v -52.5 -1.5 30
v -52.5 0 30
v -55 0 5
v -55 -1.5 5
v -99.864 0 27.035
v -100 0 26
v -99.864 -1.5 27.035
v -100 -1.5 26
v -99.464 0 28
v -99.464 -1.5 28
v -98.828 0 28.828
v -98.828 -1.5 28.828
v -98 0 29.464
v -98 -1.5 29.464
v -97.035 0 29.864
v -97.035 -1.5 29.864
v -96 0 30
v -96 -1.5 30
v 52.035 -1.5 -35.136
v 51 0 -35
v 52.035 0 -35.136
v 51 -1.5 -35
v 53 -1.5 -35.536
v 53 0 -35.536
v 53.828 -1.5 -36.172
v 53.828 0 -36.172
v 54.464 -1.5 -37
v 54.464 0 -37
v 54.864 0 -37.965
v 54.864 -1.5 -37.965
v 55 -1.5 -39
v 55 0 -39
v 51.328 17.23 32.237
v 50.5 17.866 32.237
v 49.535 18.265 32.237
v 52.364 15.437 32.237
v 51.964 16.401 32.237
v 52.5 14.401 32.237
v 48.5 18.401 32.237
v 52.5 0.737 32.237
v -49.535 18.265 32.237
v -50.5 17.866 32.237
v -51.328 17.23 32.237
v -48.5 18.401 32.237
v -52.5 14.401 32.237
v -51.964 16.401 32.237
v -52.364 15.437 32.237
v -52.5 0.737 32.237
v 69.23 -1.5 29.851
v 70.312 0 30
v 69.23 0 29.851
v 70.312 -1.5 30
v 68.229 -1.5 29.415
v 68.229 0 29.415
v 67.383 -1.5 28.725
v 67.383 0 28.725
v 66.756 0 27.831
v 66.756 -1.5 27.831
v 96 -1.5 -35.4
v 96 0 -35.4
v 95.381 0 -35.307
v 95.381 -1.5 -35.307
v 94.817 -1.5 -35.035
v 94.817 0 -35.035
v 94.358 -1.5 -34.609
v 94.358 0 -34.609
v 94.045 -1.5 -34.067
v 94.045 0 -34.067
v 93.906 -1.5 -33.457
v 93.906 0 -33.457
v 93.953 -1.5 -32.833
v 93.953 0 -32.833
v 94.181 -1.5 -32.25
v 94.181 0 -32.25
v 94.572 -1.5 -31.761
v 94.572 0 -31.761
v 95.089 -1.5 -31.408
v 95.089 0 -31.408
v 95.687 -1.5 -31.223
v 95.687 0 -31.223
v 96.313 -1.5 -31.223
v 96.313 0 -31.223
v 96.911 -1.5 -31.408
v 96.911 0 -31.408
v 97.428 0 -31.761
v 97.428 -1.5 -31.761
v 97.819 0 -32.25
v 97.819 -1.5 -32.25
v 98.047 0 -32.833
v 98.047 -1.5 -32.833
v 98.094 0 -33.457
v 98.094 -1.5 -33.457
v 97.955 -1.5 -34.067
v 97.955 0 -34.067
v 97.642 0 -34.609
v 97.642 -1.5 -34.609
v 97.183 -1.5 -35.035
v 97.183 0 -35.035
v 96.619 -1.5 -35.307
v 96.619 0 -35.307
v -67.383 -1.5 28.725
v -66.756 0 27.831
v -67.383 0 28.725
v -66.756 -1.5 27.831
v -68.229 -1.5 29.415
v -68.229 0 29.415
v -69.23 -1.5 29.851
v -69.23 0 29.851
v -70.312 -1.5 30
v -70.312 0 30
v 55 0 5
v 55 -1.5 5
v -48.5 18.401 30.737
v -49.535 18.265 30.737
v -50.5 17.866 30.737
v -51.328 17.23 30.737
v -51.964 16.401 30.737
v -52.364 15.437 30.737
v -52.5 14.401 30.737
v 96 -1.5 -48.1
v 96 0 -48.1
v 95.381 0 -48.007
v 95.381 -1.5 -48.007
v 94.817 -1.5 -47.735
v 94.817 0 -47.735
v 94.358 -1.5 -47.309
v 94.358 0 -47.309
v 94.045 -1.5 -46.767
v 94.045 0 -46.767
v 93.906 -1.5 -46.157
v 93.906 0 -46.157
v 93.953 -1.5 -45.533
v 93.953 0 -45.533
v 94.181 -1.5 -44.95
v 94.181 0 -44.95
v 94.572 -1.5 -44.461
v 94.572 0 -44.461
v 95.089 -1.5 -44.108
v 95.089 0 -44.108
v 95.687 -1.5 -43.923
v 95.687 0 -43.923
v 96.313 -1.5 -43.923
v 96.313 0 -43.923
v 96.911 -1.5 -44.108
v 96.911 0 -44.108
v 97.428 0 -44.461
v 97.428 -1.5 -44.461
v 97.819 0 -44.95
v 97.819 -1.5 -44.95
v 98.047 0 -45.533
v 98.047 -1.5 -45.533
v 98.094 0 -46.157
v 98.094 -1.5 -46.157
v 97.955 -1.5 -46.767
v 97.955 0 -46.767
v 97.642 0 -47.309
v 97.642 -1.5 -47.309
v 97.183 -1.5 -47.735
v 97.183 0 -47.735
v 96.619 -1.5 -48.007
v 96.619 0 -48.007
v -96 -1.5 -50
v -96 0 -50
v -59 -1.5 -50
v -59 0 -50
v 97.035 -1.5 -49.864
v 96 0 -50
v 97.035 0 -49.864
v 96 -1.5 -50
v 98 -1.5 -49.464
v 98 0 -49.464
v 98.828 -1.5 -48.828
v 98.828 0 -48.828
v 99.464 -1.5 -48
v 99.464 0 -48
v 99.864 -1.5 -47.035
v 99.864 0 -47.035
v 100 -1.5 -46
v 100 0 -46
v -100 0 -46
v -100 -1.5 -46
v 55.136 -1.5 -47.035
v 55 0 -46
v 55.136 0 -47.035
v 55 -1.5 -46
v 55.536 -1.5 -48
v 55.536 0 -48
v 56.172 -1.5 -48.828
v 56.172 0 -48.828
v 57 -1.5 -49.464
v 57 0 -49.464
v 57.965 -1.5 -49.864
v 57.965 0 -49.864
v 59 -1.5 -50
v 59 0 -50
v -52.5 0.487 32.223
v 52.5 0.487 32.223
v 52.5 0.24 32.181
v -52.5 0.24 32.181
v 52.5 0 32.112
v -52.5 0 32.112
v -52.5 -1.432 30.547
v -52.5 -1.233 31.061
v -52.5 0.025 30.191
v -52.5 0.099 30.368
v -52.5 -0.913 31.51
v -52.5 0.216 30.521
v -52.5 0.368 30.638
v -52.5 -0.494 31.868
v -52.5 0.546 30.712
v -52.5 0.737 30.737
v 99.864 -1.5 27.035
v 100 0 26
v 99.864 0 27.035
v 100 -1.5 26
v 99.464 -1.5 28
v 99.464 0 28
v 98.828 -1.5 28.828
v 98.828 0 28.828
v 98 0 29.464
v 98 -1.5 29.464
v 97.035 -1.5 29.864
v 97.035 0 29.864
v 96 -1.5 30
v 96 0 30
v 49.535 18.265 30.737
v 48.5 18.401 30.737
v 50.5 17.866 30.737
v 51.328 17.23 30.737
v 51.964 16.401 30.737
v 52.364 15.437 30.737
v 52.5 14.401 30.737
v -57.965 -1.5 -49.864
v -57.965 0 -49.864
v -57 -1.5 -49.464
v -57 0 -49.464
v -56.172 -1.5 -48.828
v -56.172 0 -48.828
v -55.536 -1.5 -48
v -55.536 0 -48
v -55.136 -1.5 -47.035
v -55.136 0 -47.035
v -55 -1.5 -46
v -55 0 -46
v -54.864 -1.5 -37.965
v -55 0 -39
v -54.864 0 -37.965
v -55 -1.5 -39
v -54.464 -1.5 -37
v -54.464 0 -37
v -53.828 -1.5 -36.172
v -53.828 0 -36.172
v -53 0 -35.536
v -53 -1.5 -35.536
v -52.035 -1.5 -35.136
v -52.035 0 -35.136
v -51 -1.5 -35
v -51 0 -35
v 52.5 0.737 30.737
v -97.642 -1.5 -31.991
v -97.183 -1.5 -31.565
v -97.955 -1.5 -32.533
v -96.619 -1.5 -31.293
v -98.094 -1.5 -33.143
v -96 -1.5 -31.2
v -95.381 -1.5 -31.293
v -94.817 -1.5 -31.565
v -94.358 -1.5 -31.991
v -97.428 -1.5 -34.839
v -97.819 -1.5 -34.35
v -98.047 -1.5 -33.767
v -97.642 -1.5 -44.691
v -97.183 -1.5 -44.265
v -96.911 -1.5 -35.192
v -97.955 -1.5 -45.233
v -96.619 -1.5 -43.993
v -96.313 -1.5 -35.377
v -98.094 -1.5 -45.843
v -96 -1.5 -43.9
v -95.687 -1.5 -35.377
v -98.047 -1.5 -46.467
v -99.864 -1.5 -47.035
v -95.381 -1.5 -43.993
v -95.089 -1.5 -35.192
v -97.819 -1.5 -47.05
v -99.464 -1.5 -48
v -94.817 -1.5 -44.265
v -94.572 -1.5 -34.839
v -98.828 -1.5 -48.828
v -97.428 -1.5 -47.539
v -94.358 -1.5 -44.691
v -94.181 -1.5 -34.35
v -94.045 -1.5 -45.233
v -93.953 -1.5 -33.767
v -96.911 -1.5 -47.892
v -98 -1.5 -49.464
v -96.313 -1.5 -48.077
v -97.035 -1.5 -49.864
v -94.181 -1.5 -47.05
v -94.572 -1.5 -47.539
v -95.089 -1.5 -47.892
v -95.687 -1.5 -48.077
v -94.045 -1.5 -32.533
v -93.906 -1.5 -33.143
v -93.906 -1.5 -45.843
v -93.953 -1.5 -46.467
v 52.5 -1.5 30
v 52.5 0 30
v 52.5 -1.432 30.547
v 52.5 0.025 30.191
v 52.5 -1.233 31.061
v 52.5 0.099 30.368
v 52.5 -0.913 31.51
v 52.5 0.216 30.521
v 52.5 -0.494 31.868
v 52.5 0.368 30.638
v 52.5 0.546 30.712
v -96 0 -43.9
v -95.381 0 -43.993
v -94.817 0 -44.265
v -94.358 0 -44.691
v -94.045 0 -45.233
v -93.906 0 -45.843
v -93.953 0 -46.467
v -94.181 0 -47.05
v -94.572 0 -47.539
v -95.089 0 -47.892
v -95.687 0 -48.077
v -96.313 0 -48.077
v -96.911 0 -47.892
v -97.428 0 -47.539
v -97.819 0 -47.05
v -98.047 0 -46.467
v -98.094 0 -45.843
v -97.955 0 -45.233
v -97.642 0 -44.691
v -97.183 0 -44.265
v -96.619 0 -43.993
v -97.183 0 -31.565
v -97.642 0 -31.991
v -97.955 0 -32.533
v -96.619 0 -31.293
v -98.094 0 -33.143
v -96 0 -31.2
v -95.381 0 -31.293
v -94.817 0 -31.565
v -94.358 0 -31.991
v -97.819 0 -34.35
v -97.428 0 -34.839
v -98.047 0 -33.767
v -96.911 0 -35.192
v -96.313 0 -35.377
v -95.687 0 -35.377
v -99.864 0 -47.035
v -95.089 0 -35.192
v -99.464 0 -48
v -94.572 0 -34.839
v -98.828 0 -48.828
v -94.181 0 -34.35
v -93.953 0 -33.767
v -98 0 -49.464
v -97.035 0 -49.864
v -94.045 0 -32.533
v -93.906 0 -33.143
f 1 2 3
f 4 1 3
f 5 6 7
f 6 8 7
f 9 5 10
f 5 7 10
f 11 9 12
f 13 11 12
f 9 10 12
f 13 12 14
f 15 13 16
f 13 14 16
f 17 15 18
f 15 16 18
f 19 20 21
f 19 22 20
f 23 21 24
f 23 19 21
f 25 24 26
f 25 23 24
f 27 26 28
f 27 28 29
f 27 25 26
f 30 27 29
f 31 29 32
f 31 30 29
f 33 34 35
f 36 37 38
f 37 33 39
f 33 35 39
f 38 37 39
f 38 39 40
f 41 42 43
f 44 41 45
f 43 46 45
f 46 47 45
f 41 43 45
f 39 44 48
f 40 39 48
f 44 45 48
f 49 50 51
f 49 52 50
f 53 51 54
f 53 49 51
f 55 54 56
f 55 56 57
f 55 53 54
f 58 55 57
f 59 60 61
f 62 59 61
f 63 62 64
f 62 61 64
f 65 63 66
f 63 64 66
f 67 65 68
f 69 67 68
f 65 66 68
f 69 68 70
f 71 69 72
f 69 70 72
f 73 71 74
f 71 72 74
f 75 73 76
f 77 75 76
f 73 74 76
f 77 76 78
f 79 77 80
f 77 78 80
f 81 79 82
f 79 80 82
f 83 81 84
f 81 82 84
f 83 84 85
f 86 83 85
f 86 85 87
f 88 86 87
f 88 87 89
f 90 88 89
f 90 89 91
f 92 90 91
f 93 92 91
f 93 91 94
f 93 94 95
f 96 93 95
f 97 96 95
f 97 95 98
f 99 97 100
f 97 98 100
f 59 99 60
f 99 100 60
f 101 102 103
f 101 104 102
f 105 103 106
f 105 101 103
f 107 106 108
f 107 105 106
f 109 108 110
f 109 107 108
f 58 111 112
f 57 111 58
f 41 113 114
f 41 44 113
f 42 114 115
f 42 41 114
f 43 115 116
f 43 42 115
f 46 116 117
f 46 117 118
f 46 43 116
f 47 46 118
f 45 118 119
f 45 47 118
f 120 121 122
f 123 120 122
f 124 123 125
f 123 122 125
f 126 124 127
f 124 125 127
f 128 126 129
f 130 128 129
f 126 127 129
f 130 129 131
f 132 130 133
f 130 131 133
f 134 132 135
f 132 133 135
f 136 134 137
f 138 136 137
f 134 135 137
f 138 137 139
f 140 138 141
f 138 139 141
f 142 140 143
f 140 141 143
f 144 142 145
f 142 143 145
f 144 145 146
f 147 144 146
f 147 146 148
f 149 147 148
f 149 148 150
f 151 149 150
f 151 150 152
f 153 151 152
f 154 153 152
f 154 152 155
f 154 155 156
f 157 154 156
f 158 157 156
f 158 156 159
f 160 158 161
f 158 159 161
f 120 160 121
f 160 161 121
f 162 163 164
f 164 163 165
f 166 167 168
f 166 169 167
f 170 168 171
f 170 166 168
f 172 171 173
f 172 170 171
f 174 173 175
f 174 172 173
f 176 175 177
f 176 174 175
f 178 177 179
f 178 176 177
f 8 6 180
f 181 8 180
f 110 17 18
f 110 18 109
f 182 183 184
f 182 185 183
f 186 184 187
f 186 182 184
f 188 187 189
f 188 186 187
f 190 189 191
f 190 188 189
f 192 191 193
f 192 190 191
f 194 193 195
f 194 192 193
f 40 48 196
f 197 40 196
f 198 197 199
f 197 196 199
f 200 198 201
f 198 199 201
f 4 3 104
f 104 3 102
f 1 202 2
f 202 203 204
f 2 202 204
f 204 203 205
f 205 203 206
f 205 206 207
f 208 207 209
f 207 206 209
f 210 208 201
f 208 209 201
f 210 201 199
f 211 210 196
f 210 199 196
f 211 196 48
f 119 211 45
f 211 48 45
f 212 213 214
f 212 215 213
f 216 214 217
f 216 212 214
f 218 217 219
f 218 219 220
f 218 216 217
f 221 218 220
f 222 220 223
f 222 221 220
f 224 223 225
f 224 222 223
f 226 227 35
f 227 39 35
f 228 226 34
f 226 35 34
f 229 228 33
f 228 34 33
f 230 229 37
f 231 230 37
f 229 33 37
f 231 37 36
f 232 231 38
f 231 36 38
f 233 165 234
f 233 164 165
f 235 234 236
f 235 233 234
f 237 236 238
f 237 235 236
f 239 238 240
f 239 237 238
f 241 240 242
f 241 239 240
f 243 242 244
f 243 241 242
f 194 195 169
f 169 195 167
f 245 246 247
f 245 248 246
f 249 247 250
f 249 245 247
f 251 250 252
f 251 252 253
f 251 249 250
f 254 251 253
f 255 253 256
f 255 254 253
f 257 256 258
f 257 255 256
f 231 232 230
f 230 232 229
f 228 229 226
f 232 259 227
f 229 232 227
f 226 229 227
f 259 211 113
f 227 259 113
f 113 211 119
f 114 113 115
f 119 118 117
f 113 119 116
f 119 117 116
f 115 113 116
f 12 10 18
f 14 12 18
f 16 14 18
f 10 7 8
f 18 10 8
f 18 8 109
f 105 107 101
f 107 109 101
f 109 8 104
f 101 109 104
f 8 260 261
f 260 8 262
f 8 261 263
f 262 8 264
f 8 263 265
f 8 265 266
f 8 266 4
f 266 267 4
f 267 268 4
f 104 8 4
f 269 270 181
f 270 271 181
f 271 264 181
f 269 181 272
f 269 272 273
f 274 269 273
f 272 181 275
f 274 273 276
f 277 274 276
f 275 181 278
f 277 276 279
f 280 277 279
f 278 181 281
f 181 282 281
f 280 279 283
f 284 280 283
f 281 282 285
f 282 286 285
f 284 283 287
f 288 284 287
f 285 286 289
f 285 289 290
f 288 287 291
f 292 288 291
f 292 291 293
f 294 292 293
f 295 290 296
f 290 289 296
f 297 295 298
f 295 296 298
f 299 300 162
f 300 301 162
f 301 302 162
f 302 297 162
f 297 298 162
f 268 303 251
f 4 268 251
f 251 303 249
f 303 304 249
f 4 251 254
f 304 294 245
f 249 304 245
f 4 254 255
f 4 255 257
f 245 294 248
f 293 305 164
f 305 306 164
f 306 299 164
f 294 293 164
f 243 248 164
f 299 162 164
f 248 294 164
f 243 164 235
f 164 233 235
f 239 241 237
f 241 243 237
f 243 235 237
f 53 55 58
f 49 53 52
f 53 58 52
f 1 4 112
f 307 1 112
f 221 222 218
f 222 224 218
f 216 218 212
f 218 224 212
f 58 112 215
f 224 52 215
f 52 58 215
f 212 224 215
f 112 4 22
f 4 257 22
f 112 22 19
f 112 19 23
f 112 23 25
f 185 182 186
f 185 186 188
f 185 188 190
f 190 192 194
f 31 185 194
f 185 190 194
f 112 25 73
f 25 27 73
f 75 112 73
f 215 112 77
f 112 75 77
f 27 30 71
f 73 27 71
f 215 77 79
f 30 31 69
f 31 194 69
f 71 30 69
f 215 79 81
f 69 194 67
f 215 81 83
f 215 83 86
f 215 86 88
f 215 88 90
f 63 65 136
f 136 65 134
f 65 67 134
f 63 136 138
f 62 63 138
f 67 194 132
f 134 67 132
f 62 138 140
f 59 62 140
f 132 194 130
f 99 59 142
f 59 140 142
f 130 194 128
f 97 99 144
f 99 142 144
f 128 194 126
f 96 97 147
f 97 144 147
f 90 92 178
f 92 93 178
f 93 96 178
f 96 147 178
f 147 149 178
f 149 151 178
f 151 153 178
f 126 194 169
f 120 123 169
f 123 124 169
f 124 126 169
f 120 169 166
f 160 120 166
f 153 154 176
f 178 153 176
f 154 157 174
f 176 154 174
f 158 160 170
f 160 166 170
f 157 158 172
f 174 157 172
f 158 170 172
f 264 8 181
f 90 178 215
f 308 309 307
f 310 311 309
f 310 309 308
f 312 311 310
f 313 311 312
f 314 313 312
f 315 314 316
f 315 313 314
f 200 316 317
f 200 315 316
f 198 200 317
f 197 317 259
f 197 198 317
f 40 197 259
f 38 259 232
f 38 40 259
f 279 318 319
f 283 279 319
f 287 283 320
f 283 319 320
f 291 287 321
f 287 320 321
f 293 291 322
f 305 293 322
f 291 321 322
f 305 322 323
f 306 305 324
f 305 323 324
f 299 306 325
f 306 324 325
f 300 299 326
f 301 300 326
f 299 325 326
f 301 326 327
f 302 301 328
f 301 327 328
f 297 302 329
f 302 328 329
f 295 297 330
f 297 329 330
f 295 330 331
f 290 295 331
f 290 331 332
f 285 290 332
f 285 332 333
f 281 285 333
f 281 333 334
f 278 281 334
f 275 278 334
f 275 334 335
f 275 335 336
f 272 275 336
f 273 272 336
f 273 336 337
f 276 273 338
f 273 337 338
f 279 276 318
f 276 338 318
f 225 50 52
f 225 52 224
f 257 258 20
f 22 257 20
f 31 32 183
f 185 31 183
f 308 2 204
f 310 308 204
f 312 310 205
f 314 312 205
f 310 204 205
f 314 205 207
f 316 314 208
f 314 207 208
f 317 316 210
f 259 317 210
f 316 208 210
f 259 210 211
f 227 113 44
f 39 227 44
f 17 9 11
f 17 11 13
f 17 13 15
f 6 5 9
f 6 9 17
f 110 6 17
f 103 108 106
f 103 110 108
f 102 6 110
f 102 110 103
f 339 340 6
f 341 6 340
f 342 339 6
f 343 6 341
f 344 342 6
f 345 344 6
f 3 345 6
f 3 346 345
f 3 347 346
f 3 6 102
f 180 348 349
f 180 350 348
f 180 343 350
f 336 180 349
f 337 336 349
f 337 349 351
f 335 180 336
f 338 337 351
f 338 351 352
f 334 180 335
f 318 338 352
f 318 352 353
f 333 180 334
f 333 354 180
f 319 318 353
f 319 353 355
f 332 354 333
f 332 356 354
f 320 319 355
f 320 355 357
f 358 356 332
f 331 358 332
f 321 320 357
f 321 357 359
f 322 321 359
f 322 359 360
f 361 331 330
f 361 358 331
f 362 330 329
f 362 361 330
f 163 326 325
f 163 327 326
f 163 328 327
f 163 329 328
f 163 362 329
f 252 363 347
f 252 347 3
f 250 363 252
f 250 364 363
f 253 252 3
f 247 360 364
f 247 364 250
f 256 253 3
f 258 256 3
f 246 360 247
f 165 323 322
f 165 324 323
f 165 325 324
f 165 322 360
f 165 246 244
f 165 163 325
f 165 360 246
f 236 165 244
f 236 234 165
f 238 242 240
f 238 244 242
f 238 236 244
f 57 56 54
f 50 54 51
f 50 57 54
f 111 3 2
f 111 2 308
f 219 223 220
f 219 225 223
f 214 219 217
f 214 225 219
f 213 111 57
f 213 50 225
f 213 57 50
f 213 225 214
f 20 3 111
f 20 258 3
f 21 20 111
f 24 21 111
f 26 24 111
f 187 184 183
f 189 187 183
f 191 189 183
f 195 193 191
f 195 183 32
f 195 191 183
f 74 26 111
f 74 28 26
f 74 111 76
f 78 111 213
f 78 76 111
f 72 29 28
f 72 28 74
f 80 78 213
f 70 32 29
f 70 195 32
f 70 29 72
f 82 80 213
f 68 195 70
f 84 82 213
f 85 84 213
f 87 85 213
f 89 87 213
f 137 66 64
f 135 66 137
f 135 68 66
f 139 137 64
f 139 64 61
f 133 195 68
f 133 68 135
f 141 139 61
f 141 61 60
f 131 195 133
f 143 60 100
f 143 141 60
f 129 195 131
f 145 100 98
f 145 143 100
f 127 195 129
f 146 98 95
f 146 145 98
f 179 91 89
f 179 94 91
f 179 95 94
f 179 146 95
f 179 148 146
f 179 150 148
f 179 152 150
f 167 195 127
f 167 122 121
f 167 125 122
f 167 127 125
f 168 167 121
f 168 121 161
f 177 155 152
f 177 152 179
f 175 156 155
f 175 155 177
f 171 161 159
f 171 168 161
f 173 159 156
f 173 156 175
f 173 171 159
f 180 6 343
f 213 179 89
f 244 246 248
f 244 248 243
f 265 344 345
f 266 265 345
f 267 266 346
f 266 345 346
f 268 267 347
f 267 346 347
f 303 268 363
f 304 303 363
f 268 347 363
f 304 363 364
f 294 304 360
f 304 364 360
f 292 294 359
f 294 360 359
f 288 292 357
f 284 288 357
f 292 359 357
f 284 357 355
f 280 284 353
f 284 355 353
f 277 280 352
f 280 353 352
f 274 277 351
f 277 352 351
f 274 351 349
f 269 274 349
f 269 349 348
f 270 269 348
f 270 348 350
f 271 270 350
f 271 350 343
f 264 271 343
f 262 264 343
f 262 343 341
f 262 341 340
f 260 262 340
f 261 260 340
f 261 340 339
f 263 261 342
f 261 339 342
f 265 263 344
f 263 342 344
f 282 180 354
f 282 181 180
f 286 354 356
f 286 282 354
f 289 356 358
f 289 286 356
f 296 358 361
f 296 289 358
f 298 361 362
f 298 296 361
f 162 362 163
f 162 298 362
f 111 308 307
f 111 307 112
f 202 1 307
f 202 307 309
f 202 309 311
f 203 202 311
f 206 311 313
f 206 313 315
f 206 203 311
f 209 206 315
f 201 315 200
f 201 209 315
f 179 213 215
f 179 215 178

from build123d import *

# Parameters (mm, degrees)
SKETCH_18_W            = 200
SKETCH_18_H            = 100
SM_BASE_FLANGE_3_DEPTH = 1.5
SKETCH_23_W            = 55
SKETCH_23_H            = 15
SKETCH_23_W_2          = 47.5
SKETCH_23_H_2          = 20
CUT_EXTRUDE_1_DEPTH    = 1.5
CUT_EXTRUDE_2_DEPTH    = 1.5
OTHER_START            = -52.5
OTHER_2_DEPTH          = 105
OTHER_2_2_DEPTH        = 105
FILLET_1_R             = 4
SKETCH_26_R            = 2.1
CUT_EXTRUDE_3_DEPTH    = 1.5


# Read off the part's stored shape, not the designer's step: 绘制的折弯2
# Sheet-metal steps are written as plain solids
with BuildPart() as part:
    # 草图18 → 基体-法兰3 (new body)
    with BuildSketch(Plane(origin=(0, 0, 0), x_dir=(1, 0, 0), z_dir=(0, 1, 0))):
        Rectangle(SKETCH_18_W, SKETCH_18_H)
    extrude(amount=-SM_BASE_FLANGE_3_DEPTH)

    # 草图23 → 切除-拉伸1 (cut)
    with BuildSketch(Plane(origin=(0, 0, 0), x_dir=(1, 0, 0), z_dir=(0, 1, 0))):
        with Locations((27.5, 42.5)):
            Rectangle(SKETCH_23_W, SKETCH_23_H)
        with Locations((-27.5, 42.5)):
            Rectangle(SKETCH_23_W, SKETCH_23_H)
        with Locations((76.25, -40)):
            Rectangle(SKETCH_23_W_2, SKETCH_23_H_2)
        with Locations((-76.25, -40)):
            Rectangle(SKETCH_23_W_2, SKETCH_23_H_2)
    extrude(amount=-CUT_EXTRUDE_1_DEPTH, mode=Mode.SUBTRACT)

    # 草图24 → 切除-拉伸2 (cut)
    with BuildSketch(Plane(origin=(0, 0, 0), x_dir=(1, 0, 0), z_dir=(0, 1, 0))):
        Polygon((-52.5, -30), (-55, -5), (-67.872428489, -30), align=None)
        Polygon((55, -5), (67.872428489, -30), (52.5, -30), align=None)
    extrude(amount=-CUT_EXTRUDE_2_DEPTH, mode=Mode.SUBTRACT)

    # Other 2 outline → Other 2 (cut)
    with BuildSketch(Plane.YZ.offset(OTHER_START)):
        with BuildLine():
            ThreePointArc((-1.5, 30), (-1.086838938, 31.295164082), (0, 32.111823856))
            Line((0, 32.111823856), (0, 50))
            Line((0, 50), (-1.5, 50))
            Line((-1.5, 50), (-1.5, 30))
        make_face()
    extrude(amount=OTHER_2_DEPTH, mode=Mode.SUBTRACT)

    # Other 2 2 outline → Other 2 2 (add)
    with BuildSketch(Plane.YZ.offset(OTHER_START)):
        with BuildLine():
            Line((18.401454181, 30.7366), (18.401454181, 32.2366))
            Line((18.401454181, 32.2366), (0.7366, 32.2366))
            ThreePointArc((0.7366, 32.2366), (0.363053267, 32.205185343), (0, 32.111823856))
            Line((0, 32.111823856), (0, 30))
            ThreePointArc((0, 30), (0.215745145, 30.520854855), (0.7366, 30.7366))
            Line((0.7366, 30.7366), (18.401454181, 30.7366))
        make_face()
    extrude(amount=OTHER_2_2_DEPTH)

    # 圆角1
    fillet_1_edges = [part.edges().sort_by_distance(p)[0] for p in [
        (67.872428489, -0.75, 30),
        (100, -0.75, 30),
        (100, -0.75, -50),
        (55, -0.75, -50),
        (55, -0.75, -35),
        (-55, -0.75, -35),
        (-55, -0.75, -50),
        (-100, -0.75, -50),
        (-100, -0.75, 30),
        (-67.872428489, -0.75, 30),
        (52.5, 18.401454181, 31.4866),
        (-52.5, 18.401454181, 31.4866),
    ]]
    fillet(fillet_1_edges, radius=FILLET_1_R)

    # 草图26 → 切除-拉伸3 (cut)
    with BuildSketch(Plane(origin=(0, 0, 0), x_dir=(1, 0, 0), z_dir=(0, 1, 0))):
        with Locations(Location((-96, 46, 0), (0, 0, 270))):
            Circle(SKETCH_26_R)
        with Locations(Location((-96, 33.3, 0), (0, 0, 270))):
            Circle(SKETCH_26_R)
        with Locations(Location((96, 33.3, 0), (0, 0, 90))):
            Circle(SKETCH_26_R)
        with Locations(Location((96, 46, 0), (0, 0, 90))):
            Circle(SKETCH_26_R)
    extrude(amount=-CUT_EXTRUDE_3_DEPTH, mode=Mode.SUBTRACT)


solid = part.part
